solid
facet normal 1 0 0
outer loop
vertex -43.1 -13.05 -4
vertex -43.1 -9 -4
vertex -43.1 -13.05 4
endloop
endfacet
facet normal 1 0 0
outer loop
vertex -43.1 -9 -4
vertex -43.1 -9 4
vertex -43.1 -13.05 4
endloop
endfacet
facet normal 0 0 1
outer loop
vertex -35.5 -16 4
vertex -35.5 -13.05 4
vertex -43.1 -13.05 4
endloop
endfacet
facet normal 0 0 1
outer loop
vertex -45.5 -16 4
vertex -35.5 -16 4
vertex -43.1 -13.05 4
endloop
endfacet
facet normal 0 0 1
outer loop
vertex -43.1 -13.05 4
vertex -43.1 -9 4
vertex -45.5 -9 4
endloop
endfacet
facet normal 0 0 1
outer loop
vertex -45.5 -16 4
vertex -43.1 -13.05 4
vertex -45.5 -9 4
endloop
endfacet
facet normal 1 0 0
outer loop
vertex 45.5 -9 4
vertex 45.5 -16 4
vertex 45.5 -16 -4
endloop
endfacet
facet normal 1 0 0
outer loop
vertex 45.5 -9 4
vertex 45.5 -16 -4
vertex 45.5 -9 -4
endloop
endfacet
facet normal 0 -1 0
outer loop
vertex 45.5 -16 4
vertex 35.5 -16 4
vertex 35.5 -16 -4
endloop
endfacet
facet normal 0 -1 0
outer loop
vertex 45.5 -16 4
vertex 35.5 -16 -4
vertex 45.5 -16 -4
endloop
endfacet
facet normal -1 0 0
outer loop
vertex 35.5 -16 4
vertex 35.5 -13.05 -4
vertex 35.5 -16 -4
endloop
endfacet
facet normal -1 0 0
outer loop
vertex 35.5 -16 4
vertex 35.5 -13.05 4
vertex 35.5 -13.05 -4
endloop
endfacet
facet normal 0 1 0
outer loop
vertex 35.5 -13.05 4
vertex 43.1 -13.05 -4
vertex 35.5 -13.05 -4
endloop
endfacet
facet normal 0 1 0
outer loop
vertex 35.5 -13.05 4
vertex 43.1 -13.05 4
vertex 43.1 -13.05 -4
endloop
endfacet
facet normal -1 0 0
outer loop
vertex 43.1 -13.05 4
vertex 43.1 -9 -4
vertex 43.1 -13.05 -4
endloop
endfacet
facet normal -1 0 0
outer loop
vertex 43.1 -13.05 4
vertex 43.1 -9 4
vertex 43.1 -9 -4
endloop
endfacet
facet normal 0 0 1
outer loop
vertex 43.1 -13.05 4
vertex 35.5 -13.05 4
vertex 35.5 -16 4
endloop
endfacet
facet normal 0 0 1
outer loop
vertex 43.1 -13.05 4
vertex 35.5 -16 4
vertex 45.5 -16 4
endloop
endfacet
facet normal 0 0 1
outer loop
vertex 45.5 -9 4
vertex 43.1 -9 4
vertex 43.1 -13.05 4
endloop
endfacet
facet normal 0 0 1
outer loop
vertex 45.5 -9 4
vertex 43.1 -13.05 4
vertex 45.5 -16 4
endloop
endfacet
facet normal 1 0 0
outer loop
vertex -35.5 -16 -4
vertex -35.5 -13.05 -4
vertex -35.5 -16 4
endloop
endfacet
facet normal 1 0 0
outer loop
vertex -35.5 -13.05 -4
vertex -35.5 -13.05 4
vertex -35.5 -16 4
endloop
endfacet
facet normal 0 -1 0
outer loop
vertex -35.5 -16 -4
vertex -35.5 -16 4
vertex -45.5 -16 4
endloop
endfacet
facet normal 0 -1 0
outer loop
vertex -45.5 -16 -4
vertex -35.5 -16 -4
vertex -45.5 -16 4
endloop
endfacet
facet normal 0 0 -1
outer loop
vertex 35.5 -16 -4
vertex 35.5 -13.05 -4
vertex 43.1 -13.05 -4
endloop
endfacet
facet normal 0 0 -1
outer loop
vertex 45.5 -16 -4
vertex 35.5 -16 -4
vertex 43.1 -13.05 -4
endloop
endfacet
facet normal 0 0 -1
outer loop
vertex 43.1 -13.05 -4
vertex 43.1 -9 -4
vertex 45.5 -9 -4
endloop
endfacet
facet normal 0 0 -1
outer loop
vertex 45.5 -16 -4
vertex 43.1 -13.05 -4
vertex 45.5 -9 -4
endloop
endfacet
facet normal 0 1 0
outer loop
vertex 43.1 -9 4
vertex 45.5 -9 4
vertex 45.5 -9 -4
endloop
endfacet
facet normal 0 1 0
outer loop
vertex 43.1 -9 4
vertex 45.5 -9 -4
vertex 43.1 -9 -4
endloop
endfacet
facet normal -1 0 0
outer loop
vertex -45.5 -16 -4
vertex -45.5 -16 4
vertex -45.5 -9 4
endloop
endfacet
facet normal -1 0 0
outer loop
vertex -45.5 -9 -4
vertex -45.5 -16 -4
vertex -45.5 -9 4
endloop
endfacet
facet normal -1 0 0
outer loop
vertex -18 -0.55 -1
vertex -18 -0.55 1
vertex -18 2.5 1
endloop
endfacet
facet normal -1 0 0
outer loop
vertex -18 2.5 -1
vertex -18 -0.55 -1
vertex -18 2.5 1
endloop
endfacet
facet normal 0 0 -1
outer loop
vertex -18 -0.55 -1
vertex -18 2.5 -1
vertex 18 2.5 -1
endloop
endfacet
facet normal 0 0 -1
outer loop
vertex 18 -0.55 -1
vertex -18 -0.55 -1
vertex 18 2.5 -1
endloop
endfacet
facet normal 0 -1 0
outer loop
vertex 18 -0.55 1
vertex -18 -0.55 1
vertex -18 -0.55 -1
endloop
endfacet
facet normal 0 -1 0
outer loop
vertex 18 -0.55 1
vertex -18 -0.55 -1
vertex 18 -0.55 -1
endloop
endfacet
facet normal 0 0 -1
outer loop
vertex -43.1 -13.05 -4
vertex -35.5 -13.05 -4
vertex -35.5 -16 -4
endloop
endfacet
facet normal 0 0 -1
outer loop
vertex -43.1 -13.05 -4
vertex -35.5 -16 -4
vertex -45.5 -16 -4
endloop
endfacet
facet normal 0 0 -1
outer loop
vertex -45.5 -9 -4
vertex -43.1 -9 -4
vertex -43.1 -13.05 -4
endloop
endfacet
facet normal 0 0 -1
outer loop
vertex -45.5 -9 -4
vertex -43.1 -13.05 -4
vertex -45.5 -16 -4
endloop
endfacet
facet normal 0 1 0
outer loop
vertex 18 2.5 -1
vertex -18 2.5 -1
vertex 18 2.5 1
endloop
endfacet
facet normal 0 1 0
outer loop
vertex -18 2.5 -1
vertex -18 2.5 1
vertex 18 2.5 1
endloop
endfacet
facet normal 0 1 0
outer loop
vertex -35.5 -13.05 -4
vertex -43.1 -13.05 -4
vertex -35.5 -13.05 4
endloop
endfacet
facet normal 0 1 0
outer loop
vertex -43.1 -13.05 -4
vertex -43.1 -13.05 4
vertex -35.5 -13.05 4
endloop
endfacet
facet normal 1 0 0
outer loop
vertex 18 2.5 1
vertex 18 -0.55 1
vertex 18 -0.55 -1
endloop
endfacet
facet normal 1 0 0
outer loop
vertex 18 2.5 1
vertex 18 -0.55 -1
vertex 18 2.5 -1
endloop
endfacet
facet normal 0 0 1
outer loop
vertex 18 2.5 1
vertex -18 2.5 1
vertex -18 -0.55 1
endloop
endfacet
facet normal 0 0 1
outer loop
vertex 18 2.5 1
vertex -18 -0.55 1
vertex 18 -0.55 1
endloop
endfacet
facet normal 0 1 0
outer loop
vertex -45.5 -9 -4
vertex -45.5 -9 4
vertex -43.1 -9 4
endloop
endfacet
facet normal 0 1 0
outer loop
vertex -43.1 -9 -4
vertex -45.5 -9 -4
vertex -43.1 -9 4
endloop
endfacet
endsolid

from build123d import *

# Parameters (mm, degrees)
SKETCH_W     = 36
SKETCH_H     = 3.05
PAD_DEPTH    = 1
PAD001_DEPTH = 4
PAD002_DEPTH = 4


with BuildPart() as feature_positioning_lip_a:
    # Sketch → Pad (new body, symmetric)
    with BuildSketch(Plane.XY):
        with Locations((0, 0.975)):
            Rectangle(SKETCH_W, SKETCH_H)
    extrude(amount=PAD_DEPTH, both=True)


with BuildPart() as feature_positioning_lip_b:
    # Sketch001 → Pad001 (new body, symmetric)
    with BuildSketch(Plane.XY):
        Polygon((-45.5, -9), (-43.1, -9), (-43.1, -13.05), (-35.5, -13.05), (-35.5, -16), (-45.5, -16), align=None)
    extrude(amount=PAD001_DEPTH, both=True)


with BuildPart() as feature_positioning_lip_c:
    # Sketch002 → Pad002 (new body, symmetric)
    with BuildSketch(Plane.XY):
        Polygon((35.5, -13.05), (35.5, -16), (45.5, -16), (45.5, -9), (43.1, -9), (43.1, -13.05), align=None)
    extrude(amount=PAD002_DEPTH, both=True)


solid = Compound([feature_positioning_lip_a.part, feature_positioning_lip_b.part, feature_positioning_lip_c.part])
